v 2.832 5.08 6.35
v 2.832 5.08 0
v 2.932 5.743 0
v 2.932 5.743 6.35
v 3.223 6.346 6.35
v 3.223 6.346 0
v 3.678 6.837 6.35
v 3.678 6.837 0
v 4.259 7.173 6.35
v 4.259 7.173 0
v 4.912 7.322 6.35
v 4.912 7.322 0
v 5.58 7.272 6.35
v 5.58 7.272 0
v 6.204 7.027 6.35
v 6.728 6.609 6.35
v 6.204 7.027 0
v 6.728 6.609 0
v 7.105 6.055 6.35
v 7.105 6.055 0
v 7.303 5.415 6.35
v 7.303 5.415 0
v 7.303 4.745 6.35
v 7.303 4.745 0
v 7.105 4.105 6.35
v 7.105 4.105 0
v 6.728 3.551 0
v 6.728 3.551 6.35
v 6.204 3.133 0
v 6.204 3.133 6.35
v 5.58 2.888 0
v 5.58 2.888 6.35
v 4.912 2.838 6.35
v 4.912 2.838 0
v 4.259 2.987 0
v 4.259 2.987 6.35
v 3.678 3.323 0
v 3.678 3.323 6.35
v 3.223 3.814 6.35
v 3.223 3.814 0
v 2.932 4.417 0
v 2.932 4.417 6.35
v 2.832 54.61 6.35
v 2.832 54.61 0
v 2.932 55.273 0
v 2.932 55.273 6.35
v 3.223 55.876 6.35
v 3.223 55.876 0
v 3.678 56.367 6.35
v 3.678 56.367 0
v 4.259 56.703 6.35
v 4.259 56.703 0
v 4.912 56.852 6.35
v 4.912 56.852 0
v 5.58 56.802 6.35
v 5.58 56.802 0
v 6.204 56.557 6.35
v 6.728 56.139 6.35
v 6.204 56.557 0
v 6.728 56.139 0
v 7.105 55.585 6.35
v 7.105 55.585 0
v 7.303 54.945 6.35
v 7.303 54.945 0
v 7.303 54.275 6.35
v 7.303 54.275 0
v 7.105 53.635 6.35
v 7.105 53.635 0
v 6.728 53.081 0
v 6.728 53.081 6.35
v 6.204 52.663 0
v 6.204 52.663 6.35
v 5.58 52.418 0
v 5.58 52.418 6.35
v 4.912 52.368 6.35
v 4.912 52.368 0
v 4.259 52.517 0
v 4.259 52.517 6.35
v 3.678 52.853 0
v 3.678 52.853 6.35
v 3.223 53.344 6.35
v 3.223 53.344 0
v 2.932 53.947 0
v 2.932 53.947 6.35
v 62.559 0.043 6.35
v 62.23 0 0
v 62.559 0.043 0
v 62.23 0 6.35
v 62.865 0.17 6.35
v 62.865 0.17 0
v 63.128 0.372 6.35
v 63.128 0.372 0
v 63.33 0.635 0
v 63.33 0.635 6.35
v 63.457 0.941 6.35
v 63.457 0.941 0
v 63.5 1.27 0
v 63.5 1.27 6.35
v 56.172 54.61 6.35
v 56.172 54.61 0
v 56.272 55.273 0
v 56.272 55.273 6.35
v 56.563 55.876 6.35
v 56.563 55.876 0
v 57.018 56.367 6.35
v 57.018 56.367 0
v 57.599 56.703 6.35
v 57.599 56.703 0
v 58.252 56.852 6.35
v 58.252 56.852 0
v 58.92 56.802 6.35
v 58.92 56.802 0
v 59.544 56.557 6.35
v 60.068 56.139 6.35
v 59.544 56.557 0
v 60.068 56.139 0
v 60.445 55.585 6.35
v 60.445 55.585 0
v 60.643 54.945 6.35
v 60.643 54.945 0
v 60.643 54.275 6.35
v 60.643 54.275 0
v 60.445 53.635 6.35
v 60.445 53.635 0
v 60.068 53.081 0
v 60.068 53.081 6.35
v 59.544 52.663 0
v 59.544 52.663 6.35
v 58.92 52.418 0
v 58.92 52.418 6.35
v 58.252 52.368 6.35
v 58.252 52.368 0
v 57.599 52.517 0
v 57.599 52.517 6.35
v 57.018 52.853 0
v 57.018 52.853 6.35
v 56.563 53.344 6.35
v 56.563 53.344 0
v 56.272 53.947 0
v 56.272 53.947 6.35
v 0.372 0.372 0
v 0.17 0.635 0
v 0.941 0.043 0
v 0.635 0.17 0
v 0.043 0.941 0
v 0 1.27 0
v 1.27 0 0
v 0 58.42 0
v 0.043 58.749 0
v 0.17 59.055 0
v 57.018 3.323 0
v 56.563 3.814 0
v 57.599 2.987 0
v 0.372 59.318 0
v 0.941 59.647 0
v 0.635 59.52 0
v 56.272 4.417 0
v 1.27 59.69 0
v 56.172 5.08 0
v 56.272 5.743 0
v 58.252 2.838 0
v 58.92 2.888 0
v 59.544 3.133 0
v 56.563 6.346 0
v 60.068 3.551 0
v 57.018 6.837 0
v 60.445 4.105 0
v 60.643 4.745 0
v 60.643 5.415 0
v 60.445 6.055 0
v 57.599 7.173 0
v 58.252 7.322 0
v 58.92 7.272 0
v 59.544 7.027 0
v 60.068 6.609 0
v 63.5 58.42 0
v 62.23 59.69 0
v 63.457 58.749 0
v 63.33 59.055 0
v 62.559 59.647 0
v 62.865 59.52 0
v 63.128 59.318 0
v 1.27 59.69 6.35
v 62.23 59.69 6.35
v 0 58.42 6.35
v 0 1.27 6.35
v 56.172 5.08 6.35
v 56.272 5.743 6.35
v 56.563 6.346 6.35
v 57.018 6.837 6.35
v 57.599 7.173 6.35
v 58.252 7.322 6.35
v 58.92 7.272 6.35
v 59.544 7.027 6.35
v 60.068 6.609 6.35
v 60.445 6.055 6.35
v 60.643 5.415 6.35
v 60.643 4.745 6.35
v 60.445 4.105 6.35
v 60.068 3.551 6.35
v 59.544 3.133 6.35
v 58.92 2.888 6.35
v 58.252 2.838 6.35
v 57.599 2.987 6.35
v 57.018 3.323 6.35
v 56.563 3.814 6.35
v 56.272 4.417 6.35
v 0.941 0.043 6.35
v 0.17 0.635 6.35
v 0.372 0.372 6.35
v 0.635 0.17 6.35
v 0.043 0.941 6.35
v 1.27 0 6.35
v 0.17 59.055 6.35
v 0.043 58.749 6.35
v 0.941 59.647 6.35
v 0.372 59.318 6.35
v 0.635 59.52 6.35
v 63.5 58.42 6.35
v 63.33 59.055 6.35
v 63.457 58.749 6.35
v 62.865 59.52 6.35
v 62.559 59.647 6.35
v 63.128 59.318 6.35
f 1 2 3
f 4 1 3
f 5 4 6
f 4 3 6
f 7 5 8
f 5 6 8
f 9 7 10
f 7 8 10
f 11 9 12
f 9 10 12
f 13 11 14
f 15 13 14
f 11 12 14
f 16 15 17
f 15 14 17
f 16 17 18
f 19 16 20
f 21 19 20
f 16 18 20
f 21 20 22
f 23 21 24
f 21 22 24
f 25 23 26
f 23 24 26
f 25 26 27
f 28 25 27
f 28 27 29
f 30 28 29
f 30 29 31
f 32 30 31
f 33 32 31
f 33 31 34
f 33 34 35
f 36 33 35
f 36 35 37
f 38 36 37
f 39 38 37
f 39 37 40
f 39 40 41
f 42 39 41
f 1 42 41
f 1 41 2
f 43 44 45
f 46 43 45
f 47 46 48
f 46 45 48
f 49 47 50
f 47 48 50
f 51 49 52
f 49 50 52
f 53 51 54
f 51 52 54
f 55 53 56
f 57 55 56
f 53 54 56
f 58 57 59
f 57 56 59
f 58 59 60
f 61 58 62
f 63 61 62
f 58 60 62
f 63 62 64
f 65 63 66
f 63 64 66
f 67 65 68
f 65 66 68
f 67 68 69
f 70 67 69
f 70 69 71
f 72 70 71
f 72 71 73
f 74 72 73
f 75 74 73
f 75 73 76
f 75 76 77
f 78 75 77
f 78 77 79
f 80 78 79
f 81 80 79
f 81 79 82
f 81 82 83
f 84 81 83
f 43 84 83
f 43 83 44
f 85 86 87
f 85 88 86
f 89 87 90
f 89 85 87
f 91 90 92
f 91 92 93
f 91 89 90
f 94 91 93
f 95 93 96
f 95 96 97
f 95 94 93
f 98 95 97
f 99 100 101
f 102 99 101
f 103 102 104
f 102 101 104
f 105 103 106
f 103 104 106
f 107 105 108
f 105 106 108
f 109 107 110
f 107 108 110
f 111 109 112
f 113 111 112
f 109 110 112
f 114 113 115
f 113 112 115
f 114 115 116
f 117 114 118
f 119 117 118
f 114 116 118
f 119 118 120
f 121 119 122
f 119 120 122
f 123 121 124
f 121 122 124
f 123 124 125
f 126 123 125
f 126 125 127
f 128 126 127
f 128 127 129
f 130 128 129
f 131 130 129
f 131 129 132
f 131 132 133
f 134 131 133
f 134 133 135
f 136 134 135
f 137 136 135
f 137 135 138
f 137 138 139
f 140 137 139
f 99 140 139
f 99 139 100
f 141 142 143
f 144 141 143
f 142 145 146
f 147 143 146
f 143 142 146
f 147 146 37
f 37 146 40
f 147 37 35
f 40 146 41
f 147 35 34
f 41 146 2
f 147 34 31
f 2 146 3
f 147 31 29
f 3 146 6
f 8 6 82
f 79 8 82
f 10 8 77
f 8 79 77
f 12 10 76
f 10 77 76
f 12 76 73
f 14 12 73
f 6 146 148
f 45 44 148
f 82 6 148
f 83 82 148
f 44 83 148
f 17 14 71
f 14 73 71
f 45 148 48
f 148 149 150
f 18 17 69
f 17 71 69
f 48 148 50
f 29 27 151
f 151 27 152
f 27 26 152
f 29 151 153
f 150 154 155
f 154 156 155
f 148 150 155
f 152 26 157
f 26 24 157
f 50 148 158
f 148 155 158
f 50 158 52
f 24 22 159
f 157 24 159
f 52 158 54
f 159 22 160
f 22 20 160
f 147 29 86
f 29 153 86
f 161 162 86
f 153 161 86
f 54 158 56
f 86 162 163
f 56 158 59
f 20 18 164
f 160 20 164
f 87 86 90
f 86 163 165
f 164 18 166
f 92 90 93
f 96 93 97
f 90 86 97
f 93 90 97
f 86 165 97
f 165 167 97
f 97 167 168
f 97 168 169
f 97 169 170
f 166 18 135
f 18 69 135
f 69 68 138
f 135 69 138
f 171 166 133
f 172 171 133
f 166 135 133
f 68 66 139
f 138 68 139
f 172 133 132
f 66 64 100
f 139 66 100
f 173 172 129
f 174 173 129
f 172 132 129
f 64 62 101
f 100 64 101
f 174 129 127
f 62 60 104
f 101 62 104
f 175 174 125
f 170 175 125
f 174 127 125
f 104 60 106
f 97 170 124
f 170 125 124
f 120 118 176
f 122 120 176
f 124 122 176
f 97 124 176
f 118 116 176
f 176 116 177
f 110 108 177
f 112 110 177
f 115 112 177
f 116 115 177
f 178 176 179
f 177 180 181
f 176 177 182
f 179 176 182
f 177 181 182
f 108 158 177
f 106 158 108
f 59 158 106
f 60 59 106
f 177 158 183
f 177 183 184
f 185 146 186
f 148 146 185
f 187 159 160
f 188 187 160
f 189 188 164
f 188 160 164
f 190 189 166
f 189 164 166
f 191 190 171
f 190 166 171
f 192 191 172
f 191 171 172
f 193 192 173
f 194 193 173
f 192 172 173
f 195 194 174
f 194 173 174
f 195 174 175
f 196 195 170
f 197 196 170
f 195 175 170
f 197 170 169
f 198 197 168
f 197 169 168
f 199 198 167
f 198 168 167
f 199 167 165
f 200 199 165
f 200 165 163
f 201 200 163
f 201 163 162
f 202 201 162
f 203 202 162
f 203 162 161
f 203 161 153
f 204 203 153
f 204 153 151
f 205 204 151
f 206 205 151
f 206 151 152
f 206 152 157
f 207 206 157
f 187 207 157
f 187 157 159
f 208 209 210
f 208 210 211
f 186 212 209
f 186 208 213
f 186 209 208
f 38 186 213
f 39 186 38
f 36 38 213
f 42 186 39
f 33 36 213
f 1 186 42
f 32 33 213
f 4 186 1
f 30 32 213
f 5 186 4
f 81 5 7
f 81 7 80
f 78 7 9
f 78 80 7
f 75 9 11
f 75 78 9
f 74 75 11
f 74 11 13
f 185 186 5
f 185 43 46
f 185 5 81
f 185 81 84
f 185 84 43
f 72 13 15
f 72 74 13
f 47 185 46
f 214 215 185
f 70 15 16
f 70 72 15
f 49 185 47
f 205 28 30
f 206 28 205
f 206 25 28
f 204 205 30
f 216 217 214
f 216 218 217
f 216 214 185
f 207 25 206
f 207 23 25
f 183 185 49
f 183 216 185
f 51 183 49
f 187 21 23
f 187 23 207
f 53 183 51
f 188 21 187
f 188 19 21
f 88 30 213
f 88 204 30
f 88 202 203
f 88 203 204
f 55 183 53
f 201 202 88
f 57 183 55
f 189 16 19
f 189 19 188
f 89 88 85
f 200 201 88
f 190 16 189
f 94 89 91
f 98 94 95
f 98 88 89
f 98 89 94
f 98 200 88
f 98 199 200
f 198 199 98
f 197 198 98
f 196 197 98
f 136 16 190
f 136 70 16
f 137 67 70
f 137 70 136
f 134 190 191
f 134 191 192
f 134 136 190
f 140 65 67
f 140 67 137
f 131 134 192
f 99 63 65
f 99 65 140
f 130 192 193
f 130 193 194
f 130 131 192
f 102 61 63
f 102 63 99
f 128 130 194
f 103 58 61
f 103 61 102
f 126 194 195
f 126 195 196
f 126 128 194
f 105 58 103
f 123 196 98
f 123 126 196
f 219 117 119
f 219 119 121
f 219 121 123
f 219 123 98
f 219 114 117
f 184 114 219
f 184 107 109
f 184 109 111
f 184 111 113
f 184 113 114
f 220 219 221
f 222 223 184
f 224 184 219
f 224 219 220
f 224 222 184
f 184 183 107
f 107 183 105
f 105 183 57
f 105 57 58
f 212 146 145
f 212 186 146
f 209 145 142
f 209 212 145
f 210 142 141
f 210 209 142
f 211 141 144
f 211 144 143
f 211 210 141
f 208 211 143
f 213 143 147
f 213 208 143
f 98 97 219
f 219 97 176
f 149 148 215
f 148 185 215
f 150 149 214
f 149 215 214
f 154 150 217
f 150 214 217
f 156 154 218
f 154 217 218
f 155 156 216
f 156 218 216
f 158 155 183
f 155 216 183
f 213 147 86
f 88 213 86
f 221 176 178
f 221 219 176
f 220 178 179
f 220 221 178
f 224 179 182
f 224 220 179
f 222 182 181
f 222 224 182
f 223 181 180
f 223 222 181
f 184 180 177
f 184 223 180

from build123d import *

# Parameters (mm, degrees)
SKETCH1_W             = 63.5
SKETCH1_H             = 59.69
BOSS_EXTRUDE1_DEPTH   = 6.35
FILLET1_R             = 1.27
F_8_CLEARANCE_HOLE1_D = 4.4958


with BuildPart() as part:
    # Sketch1 → Boss-Extrude1 (new body)
    with BuildSketch(Plane.XY):
        with Locations((31.75, 29.845)):
            Rectangle(SKETCH1_W, SKETCH1_H)
    extrude(amount=BOSS_EXTRUDE1_DEPTH)

    # Fillet1
    fillet1_edges = [part.edges().sort_by_distance(p)[0] for p in [
        (0, 59.69, 3.175),
        (63.5, 59.69, 3.175),
        (63.5, 0, 3.175),
        (0, 0, 3.175),
    ]]
    fillet(fillet1_edges, radius=FILLET1_R)

    # #8 Clearance Hole1 (through all)
    with Locations(Plane.XY.offset(6.35)):
        with Locations((5.08, 54.61), (58.42, 54.61), (58.42, 5.08), (5.08, 5.08)):
            Hole(F_8_CLEARANCE_HOLE1_D / 2)


solid = part.part
